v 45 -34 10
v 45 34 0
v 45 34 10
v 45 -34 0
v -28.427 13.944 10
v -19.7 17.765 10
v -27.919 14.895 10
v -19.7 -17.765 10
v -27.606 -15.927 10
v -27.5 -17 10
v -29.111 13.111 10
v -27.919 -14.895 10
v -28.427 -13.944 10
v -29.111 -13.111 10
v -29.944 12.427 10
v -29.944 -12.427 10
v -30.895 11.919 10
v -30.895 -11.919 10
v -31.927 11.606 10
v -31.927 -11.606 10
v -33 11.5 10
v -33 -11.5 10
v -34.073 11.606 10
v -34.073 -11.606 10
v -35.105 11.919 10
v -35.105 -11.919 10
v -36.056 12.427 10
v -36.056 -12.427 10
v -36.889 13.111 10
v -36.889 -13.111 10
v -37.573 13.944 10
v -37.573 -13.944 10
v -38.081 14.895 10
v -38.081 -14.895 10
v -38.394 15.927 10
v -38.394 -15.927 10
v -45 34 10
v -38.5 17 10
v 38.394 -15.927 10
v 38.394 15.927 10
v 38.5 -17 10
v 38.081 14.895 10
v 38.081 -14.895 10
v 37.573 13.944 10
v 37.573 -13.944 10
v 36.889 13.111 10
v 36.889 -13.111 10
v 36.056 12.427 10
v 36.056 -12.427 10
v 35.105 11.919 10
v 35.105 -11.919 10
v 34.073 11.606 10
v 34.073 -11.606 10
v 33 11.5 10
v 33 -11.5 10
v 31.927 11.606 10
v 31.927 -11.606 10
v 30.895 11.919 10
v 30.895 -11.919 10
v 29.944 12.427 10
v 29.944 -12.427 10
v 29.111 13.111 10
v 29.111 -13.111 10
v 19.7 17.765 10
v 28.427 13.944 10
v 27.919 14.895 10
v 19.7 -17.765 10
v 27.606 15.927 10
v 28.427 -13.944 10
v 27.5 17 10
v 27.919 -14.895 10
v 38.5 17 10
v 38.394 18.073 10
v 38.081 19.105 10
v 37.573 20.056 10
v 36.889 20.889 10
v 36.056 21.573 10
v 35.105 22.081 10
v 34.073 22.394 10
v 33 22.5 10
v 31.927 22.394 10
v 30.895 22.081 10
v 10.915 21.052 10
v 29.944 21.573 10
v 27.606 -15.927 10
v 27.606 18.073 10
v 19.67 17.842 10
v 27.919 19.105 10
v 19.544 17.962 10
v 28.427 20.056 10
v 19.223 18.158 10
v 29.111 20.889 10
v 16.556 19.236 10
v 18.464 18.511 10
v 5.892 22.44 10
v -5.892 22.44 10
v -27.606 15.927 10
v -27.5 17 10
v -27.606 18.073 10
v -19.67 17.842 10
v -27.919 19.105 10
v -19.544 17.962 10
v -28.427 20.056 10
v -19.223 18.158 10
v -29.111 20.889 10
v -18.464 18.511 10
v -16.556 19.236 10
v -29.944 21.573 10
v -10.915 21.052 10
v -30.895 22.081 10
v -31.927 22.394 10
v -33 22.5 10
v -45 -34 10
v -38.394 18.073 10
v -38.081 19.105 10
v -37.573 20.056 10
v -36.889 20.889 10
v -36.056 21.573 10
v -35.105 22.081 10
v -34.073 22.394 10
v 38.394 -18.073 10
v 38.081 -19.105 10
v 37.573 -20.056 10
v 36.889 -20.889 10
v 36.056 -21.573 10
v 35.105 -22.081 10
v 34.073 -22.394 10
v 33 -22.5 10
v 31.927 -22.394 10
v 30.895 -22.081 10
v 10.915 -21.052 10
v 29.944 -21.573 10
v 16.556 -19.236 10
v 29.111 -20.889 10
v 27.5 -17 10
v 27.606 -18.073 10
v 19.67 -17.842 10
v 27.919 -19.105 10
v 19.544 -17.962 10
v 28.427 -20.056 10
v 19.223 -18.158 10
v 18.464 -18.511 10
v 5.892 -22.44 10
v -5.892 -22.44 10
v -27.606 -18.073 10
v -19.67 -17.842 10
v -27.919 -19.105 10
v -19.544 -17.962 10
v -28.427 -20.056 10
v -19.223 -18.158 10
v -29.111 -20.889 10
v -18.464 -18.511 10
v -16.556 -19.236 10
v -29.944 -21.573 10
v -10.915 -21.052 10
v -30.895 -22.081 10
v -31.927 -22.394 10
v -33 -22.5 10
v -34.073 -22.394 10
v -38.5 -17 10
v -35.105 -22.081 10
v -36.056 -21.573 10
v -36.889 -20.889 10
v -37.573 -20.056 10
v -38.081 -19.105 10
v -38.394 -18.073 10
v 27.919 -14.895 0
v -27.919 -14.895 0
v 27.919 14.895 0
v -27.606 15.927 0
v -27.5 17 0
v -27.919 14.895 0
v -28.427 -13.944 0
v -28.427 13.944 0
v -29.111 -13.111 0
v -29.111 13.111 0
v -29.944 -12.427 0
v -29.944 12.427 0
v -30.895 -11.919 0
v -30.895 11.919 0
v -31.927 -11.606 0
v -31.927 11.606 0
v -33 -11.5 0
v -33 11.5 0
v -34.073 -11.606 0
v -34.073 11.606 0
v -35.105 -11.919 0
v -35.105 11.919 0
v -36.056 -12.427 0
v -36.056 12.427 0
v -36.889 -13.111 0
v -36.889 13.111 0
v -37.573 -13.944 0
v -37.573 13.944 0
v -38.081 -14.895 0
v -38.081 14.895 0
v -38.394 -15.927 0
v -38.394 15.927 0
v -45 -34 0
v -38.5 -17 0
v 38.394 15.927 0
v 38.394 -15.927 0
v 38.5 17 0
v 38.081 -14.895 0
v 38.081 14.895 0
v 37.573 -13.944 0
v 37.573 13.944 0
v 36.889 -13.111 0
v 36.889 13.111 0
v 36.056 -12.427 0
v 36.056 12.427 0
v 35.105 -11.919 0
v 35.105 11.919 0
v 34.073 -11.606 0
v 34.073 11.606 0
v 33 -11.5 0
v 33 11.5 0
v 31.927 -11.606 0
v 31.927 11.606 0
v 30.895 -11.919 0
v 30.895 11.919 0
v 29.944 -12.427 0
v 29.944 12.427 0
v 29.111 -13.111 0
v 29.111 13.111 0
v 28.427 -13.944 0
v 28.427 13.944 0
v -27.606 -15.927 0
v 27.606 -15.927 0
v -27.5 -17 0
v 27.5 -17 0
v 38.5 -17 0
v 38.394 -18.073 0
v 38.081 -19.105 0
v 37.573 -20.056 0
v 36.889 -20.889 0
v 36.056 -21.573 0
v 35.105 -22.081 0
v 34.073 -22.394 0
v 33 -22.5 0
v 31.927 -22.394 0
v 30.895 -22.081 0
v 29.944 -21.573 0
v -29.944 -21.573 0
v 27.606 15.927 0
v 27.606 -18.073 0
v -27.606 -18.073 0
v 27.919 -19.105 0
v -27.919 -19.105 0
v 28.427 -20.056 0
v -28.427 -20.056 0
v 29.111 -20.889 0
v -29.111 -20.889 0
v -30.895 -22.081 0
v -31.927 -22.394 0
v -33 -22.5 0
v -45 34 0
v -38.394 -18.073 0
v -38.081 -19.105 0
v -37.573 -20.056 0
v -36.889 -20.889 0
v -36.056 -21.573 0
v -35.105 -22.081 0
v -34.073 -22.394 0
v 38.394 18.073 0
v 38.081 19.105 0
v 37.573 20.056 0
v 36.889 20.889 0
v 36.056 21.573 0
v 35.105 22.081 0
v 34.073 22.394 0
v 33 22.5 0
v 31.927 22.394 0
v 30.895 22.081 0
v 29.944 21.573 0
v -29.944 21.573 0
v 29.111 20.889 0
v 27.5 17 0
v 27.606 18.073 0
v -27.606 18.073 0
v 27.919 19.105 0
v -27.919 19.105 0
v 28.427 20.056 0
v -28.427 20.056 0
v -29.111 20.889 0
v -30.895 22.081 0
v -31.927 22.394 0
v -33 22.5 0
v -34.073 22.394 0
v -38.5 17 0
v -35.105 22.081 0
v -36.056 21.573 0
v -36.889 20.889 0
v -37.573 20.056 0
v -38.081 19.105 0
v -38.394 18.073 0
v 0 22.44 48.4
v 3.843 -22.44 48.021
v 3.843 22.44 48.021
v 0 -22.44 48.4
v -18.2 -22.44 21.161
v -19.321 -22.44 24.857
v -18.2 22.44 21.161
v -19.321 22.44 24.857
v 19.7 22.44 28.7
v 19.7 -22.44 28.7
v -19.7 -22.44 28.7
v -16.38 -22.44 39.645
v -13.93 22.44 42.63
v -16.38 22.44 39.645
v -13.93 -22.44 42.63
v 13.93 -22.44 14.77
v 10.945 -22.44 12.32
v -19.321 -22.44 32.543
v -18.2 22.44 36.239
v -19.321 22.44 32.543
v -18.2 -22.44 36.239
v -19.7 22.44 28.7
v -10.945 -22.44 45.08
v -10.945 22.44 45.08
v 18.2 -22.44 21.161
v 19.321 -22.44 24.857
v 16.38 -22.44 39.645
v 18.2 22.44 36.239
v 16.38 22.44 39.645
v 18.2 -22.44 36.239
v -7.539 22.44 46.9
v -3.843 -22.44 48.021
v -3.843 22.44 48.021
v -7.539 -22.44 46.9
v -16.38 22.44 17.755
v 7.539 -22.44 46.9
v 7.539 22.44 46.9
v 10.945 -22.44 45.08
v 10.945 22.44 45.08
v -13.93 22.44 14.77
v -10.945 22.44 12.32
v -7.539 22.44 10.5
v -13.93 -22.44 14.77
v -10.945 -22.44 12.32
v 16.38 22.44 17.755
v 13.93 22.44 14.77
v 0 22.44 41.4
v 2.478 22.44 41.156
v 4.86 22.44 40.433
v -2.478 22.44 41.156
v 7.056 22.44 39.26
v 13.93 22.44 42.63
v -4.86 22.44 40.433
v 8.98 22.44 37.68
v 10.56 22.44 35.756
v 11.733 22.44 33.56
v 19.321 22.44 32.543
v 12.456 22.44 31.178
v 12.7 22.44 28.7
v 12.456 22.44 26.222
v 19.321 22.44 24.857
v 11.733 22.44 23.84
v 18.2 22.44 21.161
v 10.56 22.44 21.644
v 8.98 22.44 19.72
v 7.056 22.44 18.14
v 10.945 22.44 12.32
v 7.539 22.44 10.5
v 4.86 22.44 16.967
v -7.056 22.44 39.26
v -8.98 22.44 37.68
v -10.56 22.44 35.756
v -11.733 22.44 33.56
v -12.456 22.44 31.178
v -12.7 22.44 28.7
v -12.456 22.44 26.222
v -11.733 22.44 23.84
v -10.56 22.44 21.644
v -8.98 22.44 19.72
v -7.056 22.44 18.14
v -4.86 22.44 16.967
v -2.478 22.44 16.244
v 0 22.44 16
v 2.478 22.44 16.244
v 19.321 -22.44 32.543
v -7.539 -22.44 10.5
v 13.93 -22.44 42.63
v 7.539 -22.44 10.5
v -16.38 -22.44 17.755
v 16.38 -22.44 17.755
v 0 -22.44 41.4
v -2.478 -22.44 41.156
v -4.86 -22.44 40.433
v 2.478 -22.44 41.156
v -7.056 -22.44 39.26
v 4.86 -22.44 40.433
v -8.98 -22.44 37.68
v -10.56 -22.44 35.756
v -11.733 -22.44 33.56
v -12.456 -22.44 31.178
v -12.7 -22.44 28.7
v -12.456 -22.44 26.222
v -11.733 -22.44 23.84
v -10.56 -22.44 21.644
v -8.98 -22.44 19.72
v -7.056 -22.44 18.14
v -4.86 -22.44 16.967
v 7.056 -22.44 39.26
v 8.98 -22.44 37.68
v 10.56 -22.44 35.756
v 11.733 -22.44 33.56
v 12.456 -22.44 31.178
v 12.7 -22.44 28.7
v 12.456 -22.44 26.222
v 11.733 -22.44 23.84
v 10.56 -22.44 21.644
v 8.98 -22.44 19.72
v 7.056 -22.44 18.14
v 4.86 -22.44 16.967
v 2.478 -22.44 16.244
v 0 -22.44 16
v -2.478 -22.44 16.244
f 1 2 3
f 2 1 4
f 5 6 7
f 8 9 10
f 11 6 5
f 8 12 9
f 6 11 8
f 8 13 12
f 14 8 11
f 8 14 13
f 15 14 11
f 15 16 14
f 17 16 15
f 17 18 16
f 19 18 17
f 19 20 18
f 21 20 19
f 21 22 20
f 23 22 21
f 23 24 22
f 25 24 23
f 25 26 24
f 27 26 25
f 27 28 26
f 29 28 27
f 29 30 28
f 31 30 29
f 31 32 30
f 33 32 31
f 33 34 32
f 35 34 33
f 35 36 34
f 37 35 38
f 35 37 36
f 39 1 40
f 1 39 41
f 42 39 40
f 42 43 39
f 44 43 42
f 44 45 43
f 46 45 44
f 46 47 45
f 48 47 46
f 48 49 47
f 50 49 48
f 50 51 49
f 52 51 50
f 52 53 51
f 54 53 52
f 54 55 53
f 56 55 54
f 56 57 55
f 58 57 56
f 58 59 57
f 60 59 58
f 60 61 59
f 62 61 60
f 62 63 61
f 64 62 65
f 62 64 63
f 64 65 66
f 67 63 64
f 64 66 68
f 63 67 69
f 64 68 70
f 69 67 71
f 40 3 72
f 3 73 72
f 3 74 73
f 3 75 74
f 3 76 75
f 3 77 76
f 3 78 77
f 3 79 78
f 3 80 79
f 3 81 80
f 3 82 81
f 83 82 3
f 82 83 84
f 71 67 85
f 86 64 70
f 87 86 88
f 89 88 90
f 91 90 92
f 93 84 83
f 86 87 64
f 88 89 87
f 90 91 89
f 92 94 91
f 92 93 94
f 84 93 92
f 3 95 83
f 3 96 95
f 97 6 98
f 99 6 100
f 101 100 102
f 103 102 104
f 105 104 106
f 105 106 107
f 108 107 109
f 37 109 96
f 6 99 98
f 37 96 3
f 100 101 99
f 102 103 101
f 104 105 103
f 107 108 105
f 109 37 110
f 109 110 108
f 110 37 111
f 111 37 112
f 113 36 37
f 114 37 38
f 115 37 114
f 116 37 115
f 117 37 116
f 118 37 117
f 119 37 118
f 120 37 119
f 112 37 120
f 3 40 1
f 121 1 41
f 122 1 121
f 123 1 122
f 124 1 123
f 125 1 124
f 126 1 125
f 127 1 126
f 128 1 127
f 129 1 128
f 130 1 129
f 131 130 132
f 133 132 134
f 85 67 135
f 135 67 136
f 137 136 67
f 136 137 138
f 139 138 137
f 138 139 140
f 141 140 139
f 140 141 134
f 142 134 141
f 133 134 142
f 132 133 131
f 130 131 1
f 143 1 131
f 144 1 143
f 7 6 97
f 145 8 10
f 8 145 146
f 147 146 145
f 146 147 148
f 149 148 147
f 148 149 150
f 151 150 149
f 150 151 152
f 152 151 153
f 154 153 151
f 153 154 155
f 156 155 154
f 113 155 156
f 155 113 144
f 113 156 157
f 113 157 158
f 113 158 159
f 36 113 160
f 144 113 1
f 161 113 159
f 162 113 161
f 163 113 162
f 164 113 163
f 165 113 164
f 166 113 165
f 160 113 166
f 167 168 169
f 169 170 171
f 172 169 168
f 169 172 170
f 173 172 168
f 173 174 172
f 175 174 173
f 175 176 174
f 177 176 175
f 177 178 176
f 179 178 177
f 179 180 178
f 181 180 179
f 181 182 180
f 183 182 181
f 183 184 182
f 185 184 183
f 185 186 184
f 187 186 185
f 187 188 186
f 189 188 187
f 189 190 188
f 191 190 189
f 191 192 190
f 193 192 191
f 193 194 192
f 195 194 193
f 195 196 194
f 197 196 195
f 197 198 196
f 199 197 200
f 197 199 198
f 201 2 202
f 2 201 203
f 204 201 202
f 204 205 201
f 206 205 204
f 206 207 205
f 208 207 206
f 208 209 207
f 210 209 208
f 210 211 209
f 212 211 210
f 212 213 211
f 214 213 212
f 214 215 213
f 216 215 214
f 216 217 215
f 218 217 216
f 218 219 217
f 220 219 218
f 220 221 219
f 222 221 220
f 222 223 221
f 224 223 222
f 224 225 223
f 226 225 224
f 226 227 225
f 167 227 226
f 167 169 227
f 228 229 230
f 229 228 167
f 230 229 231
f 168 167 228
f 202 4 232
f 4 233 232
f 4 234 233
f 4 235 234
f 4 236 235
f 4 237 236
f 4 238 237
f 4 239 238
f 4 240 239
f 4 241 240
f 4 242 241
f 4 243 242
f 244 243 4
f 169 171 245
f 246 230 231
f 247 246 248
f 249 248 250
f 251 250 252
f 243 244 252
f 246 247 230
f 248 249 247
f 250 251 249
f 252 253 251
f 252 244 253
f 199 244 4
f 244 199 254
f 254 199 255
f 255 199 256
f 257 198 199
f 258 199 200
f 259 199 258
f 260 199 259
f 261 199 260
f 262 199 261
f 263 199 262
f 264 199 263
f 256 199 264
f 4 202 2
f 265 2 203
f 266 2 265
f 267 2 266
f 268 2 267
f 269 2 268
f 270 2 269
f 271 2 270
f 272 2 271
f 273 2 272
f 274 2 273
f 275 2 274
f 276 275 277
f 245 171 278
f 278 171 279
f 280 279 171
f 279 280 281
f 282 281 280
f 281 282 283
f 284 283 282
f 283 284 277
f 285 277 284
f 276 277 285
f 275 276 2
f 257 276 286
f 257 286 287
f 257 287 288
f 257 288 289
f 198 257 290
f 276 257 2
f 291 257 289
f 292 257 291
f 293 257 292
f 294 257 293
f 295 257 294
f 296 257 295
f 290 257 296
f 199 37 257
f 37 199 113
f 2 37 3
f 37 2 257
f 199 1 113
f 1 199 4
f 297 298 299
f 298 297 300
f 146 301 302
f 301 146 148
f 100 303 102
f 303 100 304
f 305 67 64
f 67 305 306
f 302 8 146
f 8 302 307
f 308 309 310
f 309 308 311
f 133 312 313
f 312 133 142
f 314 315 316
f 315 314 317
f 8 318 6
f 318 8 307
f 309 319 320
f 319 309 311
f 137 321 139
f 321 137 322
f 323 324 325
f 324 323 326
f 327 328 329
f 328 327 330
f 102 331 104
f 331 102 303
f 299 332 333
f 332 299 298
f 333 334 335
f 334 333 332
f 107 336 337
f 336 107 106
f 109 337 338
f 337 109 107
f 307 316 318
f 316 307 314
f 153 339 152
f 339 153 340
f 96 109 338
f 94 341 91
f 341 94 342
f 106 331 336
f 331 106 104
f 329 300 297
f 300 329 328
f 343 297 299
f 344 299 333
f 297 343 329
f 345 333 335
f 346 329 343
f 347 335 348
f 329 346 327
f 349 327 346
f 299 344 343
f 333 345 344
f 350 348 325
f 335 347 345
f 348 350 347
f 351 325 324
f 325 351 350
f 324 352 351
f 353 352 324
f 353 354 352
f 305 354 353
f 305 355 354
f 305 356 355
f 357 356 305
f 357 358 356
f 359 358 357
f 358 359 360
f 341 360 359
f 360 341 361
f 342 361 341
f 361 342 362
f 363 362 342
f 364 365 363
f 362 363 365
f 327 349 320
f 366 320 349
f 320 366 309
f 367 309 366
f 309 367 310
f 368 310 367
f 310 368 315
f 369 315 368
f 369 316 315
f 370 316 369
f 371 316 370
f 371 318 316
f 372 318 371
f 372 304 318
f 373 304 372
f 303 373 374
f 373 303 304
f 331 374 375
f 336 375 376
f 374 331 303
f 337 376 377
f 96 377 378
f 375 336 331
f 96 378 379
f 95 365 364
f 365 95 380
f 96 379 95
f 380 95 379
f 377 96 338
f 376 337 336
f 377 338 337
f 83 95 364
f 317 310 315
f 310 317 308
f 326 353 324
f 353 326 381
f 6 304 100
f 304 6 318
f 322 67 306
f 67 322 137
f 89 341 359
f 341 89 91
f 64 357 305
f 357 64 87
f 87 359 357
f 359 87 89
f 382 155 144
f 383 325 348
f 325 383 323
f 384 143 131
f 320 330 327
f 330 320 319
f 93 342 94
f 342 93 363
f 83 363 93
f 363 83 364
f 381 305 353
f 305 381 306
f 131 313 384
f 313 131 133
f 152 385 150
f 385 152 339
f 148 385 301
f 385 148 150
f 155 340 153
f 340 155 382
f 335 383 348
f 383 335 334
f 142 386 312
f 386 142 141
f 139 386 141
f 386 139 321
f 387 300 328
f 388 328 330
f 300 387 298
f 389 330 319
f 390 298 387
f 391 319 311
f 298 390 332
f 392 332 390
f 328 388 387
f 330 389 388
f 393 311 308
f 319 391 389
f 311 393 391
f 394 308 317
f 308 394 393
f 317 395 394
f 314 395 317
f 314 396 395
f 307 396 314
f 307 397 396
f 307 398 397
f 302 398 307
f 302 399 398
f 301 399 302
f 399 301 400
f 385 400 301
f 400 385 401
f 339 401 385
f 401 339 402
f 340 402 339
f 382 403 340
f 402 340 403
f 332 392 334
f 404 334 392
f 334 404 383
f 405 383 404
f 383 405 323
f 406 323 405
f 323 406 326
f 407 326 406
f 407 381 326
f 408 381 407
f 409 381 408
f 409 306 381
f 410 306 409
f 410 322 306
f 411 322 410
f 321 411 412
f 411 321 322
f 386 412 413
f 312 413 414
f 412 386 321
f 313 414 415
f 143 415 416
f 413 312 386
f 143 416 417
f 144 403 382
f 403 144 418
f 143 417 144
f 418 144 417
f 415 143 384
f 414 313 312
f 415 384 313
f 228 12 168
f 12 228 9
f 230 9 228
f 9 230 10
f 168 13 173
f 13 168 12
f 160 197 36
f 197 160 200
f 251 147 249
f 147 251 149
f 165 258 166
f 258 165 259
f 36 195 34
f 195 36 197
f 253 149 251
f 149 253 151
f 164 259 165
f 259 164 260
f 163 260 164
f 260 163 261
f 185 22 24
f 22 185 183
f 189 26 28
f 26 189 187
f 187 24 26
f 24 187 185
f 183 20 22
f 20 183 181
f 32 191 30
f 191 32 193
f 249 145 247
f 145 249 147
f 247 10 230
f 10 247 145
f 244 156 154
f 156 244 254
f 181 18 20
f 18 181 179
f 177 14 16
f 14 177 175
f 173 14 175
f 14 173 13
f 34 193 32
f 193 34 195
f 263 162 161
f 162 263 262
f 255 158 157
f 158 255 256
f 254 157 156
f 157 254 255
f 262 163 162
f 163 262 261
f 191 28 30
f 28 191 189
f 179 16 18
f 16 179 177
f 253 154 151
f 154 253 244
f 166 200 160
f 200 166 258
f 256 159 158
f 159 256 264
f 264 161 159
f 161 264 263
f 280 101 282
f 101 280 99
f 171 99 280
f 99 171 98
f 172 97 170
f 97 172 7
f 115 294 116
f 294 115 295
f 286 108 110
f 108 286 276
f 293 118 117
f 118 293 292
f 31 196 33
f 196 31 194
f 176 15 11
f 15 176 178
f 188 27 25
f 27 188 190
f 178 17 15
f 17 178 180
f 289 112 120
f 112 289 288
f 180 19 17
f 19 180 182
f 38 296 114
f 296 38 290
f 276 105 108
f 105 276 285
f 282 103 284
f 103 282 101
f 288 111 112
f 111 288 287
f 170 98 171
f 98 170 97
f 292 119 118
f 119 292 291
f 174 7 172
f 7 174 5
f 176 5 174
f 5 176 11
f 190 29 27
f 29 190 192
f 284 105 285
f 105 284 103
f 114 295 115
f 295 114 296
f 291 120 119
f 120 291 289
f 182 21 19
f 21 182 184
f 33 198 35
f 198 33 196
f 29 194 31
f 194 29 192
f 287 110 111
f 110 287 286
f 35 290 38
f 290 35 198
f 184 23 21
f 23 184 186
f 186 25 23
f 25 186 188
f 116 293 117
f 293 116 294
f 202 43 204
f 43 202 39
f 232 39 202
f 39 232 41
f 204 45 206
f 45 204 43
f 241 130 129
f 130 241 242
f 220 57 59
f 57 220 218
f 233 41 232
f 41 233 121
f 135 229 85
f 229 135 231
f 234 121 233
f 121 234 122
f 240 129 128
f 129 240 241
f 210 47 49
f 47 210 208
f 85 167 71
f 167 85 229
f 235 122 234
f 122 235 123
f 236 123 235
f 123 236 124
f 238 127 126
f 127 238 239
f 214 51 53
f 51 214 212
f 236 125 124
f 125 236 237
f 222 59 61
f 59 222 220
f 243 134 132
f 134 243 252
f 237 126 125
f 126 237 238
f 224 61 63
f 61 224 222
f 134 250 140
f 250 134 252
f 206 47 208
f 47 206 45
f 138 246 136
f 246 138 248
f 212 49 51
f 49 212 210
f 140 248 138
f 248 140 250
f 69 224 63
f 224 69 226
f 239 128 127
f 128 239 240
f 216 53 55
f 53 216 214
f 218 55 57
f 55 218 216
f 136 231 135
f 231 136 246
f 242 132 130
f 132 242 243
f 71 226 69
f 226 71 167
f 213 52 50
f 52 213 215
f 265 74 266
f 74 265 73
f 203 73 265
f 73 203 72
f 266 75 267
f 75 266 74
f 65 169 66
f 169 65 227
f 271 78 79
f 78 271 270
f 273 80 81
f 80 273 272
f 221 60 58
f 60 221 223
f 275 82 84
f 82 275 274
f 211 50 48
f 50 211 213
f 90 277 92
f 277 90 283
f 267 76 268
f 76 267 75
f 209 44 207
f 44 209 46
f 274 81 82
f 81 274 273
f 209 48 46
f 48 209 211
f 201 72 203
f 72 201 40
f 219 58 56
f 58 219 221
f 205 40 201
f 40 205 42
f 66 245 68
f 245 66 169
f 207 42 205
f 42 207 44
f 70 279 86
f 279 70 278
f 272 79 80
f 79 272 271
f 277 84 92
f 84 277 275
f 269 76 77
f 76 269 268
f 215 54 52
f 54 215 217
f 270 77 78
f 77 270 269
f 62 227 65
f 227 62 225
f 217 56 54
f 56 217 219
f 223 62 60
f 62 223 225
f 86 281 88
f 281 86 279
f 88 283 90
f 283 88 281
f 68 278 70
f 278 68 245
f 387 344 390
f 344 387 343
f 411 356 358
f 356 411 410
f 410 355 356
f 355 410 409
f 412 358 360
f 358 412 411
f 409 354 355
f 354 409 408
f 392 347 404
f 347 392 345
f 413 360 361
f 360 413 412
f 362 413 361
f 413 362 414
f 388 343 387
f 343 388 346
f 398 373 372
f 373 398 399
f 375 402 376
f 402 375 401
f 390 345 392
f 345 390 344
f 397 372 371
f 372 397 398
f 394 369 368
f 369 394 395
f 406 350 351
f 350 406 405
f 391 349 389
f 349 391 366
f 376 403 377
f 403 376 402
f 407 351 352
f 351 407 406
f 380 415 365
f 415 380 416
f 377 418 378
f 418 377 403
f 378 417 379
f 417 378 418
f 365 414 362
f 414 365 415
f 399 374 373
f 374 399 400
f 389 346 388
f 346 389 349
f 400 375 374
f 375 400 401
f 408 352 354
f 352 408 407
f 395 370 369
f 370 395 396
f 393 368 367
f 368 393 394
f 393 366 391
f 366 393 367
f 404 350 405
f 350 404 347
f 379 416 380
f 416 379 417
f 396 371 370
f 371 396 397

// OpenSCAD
$fn = 32;

// ----------------------------------------------------------------------
// Bearing block: 90 x 68 mm base, 25.4 mm bore at 28.7 mm
// ----------------------------------------------------------------------

// --- parameters (mm) ---
base_w = 90;              // base width
base_d = 68;              // base depth
base_t = 10;              // base thickness
bore_d = 25.4;            // shaft / bearing bore
house_r = 19.7;           // housing outer radius
house_len = 44.88;        // housing length along the shaft
foot_w = 39.4;            // foot width under the housing
foot_len = 34.88;         // foot length along the shaft
axis_z = 28.7;            // bore axis height above the base
holes_d = 11;             // mounting holes
hole_x = 33;              // mounting hole spacing

difference() {
  union() {
    /* base plate with its underside on z = 0 */
    translate([0, 0, base_t / 2]) cube([base_w, base_d, base_t], center = true);
    /* hull foot: a straight web blending into the round housing */
    hull() {
      translate([0, 0, base_t - 0.5]) cube([foot_w, foot_len, 1.6], center = true);
      translate([0, 0, axis_z]) rotate([-90, 0, 0]) cylinder(h = house_len, d = 2 * house_r, center = true);
    }
  }
  /* bore through the housing, 2.5 mm clear on both sides */
  translate([0, 0, axis_z]) rotate([-90, 0, 0]) cylinder(h = house_len + 5, d = bore_d, center = true);
  /* mounting holes through the base plate */
  for (hx = [-33, 33]) {
    for (hy = [-17, 17]) {
      translate([hx, hy, -2.5]) cylinder(h = base_t + 5, d = holes_d);
    }
  }
}
